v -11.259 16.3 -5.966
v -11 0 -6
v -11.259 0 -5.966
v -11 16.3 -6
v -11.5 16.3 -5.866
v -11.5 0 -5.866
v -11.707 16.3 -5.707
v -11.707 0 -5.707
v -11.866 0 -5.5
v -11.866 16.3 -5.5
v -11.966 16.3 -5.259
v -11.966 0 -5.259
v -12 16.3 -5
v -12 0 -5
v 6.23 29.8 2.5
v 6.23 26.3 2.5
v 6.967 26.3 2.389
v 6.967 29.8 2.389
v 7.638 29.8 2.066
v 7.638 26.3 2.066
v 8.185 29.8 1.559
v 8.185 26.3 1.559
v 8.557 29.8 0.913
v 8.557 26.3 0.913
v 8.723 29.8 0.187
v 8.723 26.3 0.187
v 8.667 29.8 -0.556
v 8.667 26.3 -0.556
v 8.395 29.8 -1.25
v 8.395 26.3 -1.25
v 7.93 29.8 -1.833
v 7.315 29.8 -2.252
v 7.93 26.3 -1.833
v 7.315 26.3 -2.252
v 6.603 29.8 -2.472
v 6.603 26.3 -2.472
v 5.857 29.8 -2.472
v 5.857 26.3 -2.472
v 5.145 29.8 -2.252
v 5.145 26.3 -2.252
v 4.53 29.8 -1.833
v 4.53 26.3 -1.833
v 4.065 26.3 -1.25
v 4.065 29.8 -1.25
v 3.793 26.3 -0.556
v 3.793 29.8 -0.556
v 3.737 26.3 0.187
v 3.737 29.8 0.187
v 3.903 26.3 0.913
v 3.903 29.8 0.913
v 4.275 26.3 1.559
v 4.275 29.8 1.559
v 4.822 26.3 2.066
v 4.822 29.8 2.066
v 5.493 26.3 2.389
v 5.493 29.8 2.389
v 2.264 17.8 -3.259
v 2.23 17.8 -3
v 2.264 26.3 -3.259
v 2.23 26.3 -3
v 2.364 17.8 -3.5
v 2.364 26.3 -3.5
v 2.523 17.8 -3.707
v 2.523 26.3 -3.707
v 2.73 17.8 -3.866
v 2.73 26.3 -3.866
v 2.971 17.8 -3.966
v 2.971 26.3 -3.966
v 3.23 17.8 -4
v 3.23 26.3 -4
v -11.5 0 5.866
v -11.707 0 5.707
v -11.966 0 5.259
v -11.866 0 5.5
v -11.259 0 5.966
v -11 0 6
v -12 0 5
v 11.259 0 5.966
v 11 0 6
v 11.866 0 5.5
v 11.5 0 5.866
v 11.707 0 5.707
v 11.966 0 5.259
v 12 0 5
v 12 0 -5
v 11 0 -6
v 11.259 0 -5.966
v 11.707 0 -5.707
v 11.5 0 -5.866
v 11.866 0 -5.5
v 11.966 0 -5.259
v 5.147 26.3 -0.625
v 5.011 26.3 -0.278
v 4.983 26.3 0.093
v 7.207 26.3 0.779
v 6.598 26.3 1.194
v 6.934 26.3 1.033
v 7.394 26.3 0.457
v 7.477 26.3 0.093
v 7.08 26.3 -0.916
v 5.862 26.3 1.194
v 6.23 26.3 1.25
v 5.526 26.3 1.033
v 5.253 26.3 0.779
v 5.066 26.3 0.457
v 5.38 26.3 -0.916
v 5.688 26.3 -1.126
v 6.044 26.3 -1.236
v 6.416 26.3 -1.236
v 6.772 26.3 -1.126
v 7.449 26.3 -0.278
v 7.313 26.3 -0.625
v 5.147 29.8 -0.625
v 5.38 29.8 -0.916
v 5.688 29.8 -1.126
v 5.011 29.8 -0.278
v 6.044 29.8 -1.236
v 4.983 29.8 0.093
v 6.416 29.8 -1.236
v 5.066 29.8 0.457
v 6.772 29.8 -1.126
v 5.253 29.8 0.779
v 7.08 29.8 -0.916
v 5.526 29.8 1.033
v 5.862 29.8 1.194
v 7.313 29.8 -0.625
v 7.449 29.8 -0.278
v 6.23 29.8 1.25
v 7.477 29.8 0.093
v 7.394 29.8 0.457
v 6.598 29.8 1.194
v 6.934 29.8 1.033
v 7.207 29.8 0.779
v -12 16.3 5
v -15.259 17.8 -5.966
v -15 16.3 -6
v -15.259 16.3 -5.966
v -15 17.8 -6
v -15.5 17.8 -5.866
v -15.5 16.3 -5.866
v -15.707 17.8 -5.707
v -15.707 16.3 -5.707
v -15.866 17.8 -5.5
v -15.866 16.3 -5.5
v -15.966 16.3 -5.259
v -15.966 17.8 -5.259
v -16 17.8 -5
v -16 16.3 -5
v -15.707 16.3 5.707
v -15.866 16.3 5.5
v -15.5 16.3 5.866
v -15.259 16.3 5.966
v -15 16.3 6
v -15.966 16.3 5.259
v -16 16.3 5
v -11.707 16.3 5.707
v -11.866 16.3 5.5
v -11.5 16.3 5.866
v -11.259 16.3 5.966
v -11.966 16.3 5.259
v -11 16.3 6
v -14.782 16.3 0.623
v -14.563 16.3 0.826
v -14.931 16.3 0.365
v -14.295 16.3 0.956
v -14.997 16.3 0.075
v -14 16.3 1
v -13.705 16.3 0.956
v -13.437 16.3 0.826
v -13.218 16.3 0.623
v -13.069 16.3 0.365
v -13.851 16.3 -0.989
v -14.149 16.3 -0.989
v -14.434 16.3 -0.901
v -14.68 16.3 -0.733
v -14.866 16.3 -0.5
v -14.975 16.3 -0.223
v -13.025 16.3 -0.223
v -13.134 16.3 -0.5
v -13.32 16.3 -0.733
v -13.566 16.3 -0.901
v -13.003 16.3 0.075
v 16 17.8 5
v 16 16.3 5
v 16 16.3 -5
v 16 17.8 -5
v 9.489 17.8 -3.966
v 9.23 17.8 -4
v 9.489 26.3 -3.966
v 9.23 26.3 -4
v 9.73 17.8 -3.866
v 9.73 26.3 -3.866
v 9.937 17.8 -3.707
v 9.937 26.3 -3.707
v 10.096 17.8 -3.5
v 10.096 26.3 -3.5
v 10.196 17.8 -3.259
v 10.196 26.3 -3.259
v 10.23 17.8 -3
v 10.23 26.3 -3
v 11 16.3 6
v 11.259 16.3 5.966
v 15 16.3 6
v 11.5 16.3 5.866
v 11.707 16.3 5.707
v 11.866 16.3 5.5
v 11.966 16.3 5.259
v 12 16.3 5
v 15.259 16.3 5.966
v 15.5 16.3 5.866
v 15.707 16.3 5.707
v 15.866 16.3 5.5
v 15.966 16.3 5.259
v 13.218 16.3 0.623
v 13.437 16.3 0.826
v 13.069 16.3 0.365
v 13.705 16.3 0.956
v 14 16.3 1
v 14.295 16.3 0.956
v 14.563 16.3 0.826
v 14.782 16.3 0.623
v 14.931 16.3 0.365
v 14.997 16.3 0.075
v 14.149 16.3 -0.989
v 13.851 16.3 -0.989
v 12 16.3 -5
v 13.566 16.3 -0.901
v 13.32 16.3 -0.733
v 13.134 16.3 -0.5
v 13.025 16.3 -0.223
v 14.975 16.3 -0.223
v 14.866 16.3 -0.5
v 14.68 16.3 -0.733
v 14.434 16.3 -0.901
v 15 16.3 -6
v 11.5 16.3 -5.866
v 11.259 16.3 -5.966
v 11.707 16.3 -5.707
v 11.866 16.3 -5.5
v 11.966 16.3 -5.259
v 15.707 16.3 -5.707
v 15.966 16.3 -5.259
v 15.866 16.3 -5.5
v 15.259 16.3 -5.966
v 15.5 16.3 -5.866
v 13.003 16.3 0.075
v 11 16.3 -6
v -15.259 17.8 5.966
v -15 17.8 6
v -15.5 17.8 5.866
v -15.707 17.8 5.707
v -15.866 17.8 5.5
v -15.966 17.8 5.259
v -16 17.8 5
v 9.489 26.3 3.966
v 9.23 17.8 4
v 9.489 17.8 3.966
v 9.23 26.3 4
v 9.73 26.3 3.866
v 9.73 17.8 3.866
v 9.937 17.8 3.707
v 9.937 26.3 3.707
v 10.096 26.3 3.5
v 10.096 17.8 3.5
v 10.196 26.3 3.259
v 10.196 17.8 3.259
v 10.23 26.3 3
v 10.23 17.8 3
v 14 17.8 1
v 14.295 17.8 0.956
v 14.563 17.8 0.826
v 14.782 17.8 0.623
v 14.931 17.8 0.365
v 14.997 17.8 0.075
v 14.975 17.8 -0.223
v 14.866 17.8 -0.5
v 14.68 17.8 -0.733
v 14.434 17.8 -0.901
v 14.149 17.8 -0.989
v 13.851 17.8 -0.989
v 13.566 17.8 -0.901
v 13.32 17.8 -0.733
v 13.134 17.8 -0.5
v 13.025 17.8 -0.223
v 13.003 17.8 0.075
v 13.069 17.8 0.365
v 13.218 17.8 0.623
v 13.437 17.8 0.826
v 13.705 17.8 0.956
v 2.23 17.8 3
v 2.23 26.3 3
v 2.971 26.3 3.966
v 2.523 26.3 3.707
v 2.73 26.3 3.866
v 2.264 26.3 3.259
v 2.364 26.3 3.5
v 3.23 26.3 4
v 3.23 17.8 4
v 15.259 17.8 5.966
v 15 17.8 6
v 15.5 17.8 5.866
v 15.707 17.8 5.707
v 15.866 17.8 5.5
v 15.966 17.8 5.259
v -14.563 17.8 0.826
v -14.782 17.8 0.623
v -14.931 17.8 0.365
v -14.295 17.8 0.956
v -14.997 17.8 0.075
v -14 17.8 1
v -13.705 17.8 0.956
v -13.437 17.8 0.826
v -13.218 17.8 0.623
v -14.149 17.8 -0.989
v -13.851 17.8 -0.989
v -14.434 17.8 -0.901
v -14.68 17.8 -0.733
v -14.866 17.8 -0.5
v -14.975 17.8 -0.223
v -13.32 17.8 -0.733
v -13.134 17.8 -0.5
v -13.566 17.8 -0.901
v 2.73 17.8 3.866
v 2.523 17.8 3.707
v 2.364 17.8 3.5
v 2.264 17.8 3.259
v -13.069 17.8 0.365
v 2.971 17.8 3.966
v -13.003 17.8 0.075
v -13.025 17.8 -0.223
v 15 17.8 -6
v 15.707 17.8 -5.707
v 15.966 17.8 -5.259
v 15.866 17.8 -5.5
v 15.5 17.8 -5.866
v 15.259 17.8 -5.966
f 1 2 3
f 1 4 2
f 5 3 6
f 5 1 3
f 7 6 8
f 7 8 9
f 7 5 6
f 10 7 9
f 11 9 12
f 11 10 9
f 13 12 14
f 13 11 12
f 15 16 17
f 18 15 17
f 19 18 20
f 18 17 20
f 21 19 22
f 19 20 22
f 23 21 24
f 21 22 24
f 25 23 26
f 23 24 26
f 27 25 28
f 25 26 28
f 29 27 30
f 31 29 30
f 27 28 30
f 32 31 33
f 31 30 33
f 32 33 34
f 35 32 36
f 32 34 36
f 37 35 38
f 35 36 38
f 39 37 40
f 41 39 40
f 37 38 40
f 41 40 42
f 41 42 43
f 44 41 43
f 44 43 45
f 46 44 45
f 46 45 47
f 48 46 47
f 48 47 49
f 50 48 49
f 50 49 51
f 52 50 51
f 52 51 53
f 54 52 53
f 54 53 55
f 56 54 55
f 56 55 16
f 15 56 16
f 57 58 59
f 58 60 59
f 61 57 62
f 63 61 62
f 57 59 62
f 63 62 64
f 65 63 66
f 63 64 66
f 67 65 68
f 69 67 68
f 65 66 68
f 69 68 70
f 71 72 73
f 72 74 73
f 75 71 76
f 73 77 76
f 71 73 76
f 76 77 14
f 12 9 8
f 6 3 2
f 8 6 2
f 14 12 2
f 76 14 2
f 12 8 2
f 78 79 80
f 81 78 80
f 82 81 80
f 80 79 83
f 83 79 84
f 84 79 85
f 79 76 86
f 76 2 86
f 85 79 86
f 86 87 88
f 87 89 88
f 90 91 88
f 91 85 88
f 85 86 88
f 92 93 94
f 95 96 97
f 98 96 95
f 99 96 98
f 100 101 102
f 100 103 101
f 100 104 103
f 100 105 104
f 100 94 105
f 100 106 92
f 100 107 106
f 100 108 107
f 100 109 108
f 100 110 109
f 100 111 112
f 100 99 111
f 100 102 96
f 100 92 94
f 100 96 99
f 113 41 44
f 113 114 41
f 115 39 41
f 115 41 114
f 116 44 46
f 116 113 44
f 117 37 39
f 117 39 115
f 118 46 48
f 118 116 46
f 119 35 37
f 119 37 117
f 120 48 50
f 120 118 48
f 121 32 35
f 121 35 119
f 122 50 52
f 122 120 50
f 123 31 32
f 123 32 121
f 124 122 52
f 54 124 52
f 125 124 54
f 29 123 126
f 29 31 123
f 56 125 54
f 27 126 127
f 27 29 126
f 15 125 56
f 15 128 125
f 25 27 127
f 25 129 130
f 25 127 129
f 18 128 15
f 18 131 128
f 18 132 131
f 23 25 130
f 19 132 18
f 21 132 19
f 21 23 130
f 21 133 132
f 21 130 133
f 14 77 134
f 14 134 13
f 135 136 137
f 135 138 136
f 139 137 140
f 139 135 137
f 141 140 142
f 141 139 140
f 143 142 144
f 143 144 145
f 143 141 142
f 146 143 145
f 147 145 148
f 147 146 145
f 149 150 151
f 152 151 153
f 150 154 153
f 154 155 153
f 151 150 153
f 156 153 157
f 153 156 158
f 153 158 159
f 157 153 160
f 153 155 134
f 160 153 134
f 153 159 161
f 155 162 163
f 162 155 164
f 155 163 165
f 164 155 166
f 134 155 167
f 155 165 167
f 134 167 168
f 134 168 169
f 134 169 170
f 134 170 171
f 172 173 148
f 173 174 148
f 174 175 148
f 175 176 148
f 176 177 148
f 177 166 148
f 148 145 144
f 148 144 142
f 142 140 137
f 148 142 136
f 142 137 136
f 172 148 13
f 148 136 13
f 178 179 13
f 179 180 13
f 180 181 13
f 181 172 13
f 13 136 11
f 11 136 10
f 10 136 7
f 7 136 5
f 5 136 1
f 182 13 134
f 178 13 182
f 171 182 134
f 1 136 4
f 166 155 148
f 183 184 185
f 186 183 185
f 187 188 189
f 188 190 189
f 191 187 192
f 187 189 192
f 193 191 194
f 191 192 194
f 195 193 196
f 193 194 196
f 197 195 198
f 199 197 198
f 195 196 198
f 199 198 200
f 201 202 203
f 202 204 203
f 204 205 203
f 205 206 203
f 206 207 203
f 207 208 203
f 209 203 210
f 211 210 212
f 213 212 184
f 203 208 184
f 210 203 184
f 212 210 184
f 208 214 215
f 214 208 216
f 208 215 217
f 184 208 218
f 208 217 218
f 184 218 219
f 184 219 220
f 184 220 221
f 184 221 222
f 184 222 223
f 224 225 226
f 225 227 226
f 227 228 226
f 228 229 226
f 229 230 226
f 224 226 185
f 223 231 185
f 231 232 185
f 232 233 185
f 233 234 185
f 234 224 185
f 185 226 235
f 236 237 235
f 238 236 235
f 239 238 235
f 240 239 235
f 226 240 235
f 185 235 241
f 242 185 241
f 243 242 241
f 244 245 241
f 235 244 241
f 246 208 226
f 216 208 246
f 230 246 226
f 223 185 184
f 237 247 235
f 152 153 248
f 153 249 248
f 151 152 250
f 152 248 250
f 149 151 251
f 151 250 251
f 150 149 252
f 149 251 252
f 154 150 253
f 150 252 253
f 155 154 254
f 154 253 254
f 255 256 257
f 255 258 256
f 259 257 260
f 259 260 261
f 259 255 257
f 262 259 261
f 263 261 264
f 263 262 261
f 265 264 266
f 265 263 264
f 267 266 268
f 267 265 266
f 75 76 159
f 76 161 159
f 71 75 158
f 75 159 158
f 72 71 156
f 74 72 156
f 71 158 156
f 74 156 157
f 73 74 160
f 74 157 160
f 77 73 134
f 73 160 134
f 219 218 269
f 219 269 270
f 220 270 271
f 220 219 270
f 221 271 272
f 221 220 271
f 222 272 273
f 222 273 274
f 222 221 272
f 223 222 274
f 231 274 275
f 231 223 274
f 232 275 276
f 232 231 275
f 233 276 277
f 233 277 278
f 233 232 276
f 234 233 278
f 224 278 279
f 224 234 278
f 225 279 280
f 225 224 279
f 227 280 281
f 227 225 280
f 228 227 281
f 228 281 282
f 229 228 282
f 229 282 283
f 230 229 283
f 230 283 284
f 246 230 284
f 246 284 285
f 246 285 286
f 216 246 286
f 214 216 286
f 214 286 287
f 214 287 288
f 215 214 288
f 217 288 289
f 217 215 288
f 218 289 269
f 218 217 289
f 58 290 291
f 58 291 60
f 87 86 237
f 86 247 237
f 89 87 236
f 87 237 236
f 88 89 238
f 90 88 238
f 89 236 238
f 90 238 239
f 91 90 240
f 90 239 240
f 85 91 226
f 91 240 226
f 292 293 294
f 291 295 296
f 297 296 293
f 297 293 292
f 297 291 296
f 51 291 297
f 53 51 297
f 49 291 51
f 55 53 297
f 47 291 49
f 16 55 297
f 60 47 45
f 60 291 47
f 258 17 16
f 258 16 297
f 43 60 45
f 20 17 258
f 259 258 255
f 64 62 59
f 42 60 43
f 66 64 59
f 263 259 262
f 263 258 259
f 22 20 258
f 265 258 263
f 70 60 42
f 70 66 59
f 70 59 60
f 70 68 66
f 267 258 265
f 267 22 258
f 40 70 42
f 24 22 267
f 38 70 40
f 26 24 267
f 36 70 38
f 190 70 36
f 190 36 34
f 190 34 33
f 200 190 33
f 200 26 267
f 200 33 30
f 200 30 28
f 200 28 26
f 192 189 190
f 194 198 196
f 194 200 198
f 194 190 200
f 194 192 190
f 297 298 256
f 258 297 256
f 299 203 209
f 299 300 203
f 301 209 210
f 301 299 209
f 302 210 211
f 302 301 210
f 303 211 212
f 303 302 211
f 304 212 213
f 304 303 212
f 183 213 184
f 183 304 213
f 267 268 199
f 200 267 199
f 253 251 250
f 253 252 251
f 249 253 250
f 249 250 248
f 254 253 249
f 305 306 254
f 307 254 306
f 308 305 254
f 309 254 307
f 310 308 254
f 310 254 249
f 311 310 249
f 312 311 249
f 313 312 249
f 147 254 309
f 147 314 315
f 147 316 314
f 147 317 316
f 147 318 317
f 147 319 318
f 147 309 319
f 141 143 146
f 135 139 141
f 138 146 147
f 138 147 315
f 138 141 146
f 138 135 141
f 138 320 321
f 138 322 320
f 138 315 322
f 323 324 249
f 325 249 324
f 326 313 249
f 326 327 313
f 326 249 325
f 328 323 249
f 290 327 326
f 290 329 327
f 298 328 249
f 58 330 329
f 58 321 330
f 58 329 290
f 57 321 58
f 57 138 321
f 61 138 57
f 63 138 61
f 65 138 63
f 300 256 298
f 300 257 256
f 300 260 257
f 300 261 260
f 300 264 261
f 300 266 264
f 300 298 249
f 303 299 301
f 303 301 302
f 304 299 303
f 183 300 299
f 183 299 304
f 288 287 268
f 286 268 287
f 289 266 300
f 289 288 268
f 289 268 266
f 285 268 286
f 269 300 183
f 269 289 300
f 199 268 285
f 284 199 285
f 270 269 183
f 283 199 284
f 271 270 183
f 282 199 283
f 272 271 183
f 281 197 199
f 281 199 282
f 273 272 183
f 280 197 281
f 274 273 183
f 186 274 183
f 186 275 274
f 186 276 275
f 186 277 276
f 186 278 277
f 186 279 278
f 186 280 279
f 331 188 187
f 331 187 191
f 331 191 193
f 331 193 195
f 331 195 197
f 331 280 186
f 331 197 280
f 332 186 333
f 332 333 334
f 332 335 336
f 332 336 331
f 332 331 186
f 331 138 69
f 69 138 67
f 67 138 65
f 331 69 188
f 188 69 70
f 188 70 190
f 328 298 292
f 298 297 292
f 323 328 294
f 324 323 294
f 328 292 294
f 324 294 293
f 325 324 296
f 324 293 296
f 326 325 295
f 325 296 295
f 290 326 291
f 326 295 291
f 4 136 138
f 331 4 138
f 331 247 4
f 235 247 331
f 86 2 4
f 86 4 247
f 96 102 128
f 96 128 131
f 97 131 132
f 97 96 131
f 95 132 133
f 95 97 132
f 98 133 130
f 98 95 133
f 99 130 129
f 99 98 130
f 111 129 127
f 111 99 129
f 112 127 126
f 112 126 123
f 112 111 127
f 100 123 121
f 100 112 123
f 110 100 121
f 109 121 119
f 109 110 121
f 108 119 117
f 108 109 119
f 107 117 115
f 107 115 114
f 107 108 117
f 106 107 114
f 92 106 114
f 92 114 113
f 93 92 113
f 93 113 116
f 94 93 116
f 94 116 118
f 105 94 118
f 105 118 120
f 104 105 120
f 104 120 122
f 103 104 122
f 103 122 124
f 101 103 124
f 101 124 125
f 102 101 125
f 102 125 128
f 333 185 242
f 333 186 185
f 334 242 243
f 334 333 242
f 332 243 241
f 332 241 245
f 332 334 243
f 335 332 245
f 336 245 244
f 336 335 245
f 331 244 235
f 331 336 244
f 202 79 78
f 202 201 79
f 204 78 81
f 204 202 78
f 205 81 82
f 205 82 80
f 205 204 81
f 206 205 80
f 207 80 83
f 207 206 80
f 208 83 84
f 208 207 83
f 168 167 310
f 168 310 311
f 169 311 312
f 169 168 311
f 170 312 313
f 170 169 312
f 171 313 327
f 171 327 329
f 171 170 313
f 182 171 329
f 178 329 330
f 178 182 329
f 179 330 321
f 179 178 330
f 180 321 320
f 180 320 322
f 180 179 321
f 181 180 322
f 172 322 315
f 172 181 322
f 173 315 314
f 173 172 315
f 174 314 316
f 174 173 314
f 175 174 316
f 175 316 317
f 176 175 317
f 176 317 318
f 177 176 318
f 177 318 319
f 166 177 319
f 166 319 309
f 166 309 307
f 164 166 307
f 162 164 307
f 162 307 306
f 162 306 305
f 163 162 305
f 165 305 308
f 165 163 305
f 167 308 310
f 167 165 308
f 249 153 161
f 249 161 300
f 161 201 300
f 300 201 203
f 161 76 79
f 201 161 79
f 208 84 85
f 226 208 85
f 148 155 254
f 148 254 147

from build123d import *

# Parameters (mm, degrees)
SKETCH_1_W      = 24
SKETCH_1_H      = 12
EXTRUDE_1_DEPTH = 16.3
SKETCH_2_W      = 32
SKETCH_2_H      = 12
SKETCH_2_R      = 1
SKETCH_2_W_2    = 8
SKETCH_2_H_2    = 8
EXTRUDE_3_DEPTH = 1.5
SKETCH_2_4_W    = 8
SKETCH_2_4_H    = 8
EXTRUDE_4_DEPTH = 10
SKETCH_2_5_R    = 2.5
SKETCH_2_5_R_2  = 1.25
EXTRUDE_5_DEPTH = 13.5
FILLET_1_R      = 1
FILLET_2_R      = 1
FILLET_3_R      = 1


with BuildPart() as part:
    # 草图1 → 凸台-拉伸1 (new body)
    with BuildSketch(Plane(origin=(0, 0, 0), x_dir=(1, 0, 0), z_dir=(0, 1, 0))):
        Rectangle(SKETCH_1_W, SKETCH_1_H)
    extrude(amount=EXTRUDE_1_DEPTH)

    # 草图2 → 凸台-拉伸3 (add)
    with BuildSketch(Plane(origin=(0, 16.3, 0), x_dir=(1, 0, 0), z_dir=(0, 1, 0))):
        Rectangle(SKETCH_2_W, SKETCH_2_H)
        with Locations((-14, 0)):
            Circle(SKETCH_2_R, mode=Mode.SUBTRACT)
        with Locations((6.23, 0)):
            Rectangle(SKETCH_2_W_2, SKETCH_2_H_2, mode=Mode.SUBTRACT)
        with Locations((14, 0)):
            Circle(SKETCH_2_R, mode=Mode.SUBTRACT)
    extrude(amount=EXTRUDE_3_DEPTH)

    # 草图2<4> → 凸台-拉伸4 (add)
    with BuildSketch(Plane(origin=(0, 16.3, 0), x_dir=(1, 0, 0), z_dir=(0, 1, 0))):
        with Locations((6.23, 0)):
            Rectangle(SKETCH_2_4_W, SKETCH_2_4_H)
    extrude(amount=EXTRUDE_4_DEPTH)

    # 草图2<5> → 凸台-拉伸5 (add)
    with BuildSketch(Plane(origin=(0, 16.3, 0), x_dir=(1, 0, 0), z_dir=(0, 1, 0))):
        with Locations((6.23, 0)):
            Circle(SKETCH_2_5_R)
        with Locations((6.23, 0)):
            Circle(SKETCH_2_5_R_2, mode=Mode.SUBTRACT)
    extrude(amount=EXTRUDE_5_DEPTH)

    # 圆角1
    fillet_1_edges = [part.edges().sort_by_distance(p)[0] for p in [
        (16, 17.05, -6),
        (16, 17.05, 6),
        (-16, 17.05, -6),
        (-16, 17.05, 6),
    ]]
    fillet(fillet_1_edges, radius=FILLET_1_R)

    # 圆角2
    fillet_2_edges = [part.edges().sort_by_distance(p)[0] for p in [
        (10.23, 22.05, -4),
        (2.23, 22.05, -4),
        (2.23, 22.05, 4),
        (10.23, 22.05, 4),
    ]]
    fillet(fillet_2_edges, radius=FILLET_2_R)

    # 圆角3
    fillet_3_edges = [part.edges().sort_by_distance(p)[0] for p in [
        (-12, 8.15, -6),
        (-12, 8.15, 6),
        (12, 8.15, -6),
        (12, 8.15, 6),
    ]]
    fillet(fillet_3_edges, radius=FILLET_3_R)


solid = part.part
